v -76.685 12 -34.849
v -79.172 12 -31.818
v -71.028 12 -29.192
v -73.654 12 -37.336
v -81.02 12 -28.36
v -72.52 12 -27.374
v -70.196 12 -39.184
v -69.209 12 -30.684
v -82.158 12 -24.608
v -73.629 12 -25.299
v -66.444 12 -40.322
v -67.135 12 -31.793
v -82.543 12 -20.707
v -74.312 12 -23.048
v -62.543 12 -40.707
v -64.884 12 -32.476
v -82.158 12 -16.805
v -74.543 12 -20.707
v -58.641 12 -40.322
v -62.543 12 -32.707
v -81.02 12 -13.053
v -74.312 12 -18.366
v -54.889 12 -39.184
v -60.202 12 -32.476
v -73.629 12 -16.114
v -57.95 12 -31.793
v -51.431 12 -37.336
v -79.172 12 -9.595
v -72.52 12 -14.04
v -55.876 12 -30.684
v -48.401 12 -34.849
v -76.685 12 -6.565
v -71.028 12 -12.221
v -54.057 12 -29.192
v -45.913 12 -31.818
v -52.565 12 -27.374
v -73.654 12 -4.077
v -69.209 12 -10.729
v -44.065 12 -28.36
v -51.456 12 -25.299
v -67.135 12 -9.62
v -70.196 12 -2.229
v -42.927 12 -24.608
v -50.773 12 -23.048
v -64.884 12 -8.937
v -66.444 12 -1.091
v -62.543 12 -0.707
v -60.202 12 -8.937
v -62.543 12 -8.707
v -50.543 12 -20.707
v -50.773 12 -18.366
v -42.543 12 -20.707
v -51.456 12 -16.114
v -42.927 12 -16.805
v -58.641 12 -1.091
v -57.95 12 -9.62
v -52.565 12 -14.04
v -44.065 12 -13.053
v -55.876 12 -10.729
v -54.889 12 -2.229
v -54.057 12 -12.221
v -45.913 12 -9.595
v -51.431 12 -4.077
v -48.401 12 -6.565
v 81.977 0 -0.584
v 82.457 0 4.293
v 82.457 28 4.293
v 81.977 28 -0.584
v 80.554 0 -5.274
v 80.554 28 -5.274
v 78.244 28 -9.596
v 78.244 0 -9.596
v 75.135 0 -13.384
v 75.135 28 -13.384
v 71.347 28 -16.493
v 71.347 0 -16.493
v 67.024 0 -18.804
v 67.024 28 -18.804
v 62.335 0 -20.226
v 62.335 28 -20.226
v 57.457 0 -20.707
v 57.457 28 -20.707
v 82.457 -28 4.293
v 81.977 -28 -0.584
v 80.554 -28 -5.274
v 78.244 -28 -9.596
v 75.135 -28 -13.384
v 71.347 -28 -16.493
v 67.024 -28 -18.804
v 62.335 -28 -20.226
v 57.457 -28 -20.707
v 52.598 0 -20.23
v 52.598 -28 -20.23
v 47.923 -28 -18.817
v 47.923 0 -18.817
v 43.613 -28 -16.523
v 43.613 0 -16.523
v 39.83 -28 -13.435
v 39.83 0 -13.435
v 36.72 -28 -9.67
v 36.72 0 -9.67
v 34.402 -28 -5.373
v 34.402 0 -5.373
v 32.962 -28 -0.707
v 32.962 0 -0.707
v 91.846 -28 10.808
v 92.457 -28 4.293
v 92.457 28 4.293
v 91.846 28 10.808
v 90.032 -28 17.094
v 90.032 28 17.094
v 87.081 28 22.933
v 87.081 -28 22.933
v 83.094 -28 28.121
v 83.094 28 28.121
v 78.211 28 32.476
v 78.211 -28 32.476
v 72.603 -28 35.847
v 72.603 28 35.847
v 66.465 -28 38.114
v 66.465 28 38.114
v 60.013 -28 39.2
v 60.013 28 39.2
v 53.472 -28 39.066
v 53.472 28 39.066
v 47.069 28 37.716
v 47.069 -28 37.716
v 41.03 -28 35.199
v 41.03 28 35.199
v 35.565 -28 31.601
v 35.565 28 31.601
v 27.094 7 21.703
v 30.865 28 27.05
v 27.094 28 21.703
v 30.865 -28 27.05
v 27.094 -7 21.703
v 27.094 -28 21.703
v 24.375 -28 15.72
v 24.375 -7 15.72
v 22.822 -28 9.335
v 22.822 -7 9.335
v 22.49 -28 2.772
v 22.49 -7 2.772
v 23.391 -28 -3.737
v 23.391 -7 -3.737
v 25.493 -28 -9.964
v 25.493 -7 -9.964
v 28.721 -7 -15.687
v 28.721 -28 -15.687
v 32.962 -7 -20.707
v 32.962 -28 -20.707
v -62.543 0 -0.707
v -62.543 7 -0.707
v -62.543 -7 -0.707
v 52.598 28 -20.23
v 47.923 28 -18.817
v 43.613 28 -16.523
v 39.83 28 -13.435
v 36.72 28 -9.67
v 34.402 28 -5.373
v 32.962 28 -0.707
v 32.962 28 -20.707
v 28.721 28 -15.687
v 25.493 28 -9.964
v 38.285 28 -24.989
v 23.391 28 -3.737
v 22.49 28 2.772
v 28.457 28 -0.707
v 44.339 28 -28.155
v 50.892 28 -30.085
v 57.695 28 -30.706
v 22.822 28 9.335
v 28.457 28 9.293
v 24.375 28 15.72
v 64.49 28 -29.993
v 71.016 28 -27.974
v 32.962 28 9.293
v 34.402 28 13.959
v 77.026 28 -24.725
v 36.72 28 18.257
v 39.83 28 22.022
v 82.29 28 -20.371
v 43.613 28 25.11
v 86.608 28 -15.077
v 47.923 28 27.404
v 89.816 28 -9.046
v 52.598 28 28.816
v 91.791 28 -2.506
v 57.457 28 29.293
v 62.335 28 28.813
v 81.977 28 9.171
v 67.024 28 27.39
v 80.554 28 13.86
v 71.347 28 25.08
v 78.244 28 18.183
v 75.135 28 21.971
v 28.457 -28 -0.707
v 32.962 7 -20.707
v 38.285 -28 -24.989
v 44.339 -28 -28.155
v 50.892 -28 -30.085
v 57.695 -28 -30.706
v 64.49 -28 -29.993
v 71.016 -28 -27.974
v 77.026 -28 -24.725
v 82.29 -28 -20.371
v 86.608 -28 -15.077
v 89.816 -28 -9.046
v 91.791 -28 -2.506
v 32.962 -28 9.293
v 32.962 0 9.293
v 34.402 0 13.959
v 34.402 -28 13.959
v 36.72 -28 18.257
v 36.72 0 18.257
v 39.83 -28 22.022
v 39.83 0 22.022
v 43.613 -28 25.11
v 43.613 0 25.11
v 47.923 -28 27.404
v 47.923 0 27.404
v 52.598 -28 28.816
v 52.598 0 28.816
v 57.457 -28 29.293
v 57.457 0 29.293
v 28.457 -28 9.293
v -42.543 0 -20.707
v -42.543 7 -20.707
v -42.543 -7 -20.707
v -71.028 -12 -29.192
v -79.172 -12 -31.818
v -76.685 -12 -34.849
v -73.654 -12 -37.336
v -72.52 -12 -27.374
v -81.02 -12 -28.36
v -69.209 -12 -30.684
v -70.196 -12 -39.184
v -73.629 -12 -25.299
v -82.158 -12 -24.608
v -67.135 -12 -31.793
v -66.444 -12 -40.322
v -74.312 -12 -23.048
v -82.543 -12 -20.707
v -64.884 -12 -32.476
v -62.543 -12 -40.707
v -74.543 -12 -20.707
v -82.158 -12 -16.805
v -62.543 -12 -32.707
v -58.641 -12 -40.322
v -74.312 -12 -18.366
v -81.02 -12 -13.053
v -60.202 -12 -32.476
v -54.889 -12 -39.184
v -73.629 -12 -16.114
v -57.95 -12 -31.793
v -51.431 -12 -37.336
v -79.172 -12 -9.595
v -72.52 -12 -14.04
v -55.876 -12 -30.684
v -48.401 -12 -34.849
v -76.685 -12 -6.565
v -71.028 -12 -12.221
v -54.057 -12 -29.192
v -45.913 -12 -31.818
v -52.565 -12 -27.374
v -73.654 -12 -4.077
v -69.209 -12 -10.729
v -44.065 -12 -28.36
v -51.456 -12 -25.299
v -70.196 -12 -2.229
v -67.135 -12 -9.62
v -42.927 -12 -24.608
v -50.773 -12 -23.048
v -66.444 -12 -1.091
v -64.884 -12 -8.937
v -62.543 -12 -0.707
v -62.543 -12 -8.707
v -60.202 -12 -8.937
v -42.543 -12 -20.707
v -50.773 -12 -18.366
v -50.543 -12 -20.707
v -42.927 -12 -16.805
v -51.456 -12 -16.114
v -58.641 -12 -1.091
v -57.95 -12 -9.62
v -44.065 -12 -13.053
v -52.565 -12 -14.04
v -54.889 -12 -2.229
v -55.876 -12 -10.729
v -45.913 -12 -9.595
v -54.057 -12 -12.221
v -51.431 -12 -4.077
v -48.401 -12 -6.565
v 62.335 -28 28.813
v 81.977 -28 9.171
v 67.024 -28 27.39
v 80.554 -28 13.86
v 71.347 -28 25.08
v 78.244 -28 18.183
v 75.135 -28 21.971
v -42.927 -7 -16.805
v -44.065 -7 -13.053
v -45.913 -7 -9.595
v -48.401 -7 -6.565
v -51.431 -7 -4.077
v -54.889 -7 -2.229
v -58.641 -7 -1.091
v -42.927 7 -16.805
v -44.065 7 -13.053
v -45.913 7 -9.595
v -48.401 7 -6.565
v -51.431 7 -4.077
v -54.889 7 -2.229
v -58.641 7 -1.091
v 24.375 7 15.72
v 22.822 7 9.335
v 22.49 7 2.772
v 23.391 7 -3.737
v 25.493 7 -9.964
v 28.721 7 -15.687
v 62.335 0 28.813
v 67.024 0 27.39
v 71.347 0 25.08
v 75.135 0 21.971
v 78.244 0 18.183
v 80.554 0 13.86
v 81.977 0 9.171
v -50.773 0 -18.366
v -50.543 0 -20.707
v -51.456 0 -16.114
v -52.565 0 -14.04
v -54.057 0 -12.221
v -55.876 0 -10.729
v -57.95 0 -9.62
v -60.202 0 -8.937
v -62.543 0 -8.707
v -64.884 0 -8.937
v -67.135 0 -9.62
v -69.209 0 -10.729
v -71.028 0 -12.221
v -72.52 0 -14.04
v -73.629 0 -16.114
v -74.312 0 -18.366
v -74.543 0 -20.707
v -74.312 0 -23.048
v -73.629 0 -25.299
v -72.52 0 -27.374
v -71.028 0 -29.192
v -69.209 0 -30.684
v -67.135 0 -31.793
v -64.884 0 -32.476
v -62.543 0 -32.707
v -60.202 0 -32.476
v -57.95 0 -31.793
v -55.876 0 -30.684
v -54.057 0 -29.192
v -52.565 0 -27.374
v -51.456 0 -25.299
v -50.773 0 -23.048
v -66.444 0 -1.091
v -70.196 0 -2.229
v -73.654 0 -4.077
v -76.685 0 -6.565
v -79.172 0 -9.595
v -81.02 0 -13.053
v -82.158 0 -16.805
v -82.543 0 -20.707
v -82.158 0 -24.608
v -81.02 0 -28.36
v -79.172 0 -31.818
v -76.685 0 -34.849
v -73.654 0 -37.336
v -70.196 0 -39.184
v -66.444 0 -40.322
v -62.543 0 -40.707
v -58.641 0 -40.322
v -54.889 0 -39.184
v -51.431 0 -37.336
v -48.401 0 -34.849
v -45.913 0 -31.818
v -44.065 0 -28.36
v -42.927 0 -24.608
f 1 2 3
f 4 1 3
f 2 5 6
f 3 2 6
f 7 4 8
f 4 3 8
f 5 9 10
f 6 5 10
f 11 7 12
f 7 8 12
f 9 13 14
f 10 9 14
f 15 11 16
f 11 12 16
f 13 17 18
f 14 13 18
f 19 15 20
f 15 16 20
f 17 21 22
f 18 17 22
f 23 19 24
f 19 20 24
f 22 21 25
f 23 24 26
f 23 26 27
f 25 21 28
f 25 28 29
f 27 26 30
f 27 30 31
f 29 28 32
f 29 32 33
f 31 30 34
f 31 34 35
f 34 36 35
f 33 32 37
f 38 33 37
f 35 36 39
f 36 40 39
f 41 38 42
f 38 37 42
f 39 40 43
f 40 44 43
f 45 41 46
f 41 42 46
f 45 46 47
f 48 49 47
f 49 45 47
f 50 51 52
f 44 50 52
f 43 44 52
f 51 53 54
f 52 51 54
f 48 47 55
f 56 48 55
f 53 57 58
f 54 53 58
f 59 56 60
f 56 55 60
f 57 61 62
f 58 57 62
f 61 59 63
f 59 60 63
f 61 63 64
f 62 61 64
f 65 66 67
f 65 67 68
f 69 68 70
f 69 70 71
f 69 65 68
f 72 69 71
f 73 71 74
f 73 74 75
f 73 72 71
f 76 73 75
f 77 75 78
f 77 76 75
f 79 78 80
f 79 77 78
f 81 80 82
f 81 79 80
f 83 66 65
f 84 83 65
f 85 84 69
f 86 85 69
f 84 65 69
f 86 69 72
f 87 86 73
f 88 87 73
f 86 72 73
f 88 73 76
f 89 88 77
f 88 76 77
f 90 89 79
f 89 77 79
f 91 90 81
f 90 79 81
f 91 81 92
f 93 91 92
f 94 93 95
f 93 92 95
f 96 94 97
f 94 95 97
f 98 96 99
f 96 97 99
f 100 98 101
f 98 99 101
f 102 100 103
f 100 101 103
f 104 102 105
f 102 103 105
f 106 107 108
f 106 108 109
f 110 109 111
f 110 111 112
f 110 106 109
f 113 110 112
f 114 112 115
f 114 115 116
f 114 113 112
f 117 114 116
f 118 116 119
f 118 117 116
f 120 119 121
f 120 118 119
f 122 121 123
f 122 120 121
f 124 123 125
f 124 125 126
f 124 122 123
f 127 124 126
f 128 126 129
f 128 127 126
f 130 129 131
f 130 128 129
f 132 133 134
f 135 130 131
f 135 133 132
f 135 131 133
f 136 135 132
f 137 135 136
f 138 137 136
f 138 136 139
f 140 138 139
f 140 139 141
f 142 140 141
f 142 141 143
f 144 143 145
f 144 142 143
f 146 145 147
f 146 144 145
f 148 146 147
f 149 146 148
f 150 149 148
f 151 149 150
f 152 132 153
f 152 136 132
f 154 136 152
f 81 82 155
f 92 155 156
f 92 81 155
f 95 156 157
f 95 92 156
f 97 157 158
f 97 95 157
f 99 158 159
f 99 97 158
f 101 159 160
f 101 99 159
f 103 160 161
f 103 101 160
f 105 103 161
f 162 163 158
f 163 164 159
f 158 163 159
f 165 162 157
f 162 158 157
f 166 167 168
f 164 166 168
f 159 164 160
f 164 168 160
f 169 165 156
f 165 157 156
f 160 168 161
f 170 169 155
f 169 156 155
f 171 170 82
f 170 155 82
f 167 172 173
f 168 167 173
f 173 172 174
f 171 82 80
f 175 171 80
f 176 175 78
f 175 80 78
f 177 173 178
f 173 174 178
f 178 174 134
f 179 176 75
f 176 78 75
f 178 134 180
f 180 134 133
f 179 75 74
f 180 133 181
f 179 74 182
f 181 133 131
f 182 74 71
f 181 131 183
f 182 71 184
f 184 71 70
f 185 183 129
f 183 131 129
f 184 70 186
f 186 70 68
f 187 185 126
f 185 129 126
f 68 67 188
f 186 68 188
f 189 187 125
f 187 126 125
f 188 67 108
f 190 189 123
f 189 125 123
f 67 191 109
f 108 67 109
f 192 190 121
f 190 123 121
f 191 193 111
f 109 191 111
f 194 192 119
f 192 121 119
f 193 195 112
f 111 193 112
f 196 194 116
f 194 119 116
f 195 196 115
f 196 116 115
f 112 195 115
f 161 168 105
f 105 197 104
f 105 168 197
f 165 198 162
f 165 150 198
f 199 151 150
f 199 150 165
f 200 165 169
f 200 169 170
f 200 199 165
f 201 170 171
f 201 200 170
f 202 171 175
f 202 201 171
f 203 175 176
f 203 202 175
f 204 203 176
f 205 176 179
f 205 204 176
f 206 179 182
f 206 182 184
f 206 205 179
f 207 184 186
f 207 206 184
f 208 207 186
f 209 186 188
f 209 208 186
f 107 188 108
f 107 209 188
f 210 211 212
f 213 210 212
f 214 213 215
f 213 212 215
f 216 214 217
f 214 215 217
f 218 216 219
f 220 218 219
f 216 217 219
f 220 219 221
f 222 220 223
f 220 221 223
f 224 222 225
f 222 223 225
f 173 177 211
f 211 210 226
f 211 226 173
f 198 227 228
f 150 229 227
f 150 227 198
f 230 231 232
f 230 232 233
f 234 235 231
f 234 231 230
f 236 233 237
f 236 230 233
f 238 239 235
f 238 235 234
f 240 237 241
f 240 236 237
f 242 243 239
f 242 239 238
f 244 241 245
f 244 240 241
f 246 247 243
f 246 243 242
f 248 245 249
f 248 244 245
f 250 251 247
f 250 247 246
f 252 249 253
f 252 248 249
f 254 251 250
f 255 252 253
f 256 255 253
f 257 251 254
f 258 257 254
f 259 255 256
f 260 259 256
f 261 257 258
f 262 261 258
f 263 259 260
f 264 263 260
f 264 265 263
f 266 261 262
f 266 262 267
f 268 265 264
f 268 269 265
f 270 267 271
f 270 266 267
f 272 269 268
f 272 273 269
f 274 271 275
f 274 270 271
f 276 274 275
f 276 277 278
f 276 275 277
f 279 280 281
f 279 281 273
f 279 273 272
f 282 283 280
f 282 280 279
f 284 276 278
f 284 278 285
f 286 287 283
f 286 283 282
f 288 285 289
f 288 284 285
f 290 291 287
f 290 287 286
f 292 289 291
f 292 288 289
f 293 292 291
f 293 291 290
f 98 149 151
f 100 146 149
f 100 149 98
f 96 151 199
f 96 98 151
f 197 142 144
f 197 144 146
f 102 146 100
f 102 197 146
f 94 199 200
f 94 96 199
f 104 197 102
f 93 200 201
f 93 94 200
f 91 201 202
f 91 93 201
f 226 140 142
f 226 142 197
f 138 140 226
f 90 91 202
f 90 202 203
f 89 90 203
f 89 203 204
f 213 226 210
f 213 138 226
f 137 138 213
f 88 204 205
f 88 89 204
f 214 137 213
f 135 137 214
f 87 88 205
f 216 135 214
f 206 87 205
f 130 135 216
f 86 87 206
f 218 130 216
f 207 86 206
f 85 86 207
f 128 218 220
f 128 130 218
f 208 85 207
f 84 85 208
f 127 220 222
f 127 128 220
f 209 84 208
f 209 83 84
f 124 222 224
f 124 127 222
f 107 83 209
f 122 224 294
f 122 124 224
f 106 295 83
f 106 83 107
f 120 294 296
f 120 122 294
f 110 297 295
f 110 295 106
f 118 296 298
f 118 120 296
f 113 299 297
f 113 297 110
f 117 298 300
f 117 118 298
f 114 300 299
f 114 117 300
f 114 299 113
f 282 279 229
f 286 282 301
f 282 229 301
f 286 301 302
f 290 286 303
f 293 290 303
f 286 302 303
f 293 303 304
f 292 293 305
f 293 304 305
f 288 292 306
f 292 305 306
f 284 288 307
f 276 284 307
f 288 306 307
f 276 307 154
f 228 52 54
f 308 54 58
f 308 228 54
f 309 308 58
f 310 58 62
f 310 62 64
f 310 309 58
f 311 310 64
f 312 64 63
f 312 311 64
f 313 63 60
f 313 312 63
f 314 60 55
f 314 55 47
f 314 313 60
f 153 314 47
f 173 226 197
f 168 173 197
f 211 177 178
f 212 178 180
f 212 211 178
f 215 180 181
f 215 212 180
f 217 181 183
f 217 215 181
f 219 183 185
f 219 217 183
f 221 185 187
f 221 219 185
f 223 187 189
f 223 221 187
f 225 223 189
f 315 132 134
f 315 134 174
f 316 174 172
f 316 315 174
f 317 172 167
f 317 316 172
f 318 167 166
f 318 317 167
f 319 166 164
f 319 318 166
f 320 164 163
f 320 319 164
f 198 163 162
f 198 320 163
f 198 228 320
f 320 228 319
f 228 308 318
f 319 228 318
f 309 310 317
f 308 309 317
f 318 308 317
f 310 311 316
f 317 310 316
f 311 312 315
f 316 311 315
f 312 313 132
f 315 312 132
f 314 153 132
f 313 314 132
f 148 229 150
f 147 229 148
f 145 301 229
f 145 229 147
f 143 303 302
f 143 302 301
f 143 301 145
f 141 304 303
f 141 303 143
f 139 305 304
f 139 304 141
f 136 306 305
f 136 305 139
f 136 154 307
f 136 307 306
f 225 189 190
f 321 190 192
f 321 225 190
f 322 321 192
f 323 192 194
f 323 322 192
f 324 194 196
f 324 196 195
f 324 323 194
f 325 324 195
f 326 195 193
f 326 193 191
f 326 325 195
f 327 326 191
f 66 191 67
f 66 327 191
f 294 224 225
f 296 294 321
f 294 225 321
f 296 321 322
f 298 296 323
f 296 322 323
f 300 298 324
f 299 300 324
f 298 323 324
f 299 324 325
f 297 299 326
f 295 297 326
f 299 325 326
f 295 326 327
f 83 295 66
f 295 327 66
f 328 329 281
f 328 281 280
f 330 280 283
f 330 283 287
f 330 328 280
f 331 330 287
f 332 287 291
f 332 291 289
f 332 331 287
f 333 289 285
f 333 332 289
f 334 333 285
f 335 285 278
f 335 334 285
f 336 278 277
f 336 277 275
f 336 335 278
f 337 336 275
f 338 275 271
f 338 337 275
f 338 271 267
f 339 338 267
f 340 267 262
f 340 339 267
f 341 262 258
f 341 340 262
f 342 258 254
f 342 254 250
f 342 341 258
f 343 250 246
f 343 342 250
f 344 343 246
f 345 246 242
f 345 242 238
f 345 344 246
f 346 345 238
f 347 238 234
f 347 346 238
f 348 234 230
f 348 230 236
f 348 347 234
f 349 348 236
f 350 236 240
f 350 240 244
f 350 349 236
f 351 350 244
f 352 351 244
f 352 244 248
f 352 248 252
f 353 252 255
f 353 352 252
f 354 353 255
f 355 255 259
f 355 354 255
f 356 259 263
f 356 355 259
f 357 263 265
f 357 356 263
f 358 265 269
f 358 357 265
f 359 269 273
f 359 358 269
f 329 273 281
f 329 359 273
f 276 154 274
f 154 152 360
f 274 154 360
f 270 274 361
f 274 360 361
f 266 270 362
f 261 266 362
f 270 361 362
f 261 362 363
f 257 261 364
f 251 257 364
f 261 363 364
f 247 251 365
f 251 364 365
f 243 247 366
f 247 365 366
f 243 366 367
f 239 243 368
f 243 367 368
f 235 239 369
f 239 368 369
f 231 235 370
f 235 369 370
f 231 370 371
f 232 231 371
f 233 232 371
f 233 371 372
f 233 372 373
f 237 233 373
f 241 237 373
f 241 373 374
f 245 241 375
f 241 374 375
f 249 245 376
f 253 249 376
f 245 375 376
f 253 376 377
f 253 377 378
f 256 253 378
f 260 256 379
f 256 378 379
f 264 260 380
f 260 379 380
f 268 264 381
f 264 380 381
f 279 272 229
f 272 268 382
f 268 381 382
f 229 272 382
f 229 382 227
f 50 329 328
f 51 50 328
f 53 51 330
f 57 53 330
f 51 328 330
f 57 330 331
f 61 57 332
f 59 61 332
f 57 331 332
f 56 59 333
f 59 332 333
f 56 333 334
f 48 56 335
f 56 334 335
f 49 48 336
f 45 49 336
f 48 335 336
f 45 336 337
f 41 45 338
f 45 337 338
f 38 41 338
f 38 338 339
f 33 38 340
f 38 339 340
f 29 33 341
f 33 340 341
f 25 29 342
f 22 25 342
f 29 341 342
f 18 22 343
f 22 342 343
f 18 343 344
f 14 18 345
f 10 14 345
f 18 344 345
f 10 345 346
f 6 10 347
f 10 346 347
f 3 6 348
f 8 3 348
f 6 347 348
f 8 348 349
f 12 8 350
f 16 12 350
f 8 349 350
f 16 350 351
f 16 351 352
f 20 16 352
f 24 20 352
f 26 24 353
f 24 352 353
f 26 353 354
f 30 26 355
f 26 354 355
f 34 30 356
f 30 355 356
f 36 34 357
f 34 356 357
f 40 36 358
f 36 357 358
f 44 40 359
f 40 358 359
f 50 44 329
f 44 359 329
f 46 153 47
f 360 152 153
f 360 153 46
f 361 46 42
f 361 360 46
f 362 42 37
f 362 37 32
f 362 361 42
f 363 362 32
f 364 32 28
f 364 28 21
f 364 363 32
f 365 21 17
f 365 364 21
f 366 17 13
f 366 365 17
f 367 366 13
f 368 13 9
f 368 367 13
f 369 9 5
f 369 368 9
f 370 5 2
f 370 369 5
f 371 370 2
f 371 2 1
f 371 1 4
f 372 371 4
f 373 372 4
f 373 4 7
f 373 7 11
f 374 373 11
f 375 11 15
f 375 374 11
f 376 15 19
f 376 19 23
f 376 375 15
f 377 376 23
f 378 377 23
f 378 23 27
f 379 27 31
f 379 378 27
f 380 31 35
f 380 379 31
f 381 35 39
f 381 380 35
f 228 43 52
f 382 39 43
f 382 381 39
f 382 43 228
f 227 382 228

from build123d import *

# Parameters (mm, degrees)
F1_DEPTH      = 7
F1_DEPTH_BACK = 7
F0_R          = 12
F2_DEPTH      = 12
F2_DEPTH_BACK = 12
F3_DEPTH      = 28
F3_DEPTH_BACK = 28
F5_DEPTH      = 57.4
F5_DEPTH_BACK = 40.2
F6_DEPTH      = 102.2
F6_DEPTH_BACK = 32.7


with BuildPart() as f1:
    # F0 (on Front) → F1 (new body, two sides)
    with BuildSketch(Plane.XZ) as f1_sk:
        with BuildLine():
            ThreePointArc((-62.5426396728, -0.7066852599), (-48.400504049, -6.5645496362), (-42.5426396728, -20.7066852599))
            Line((-42.5426396728, -20.7066852599), (32.9624628994, -20.7066852599))
            ThreePointArc((32.9624628994, -20.7066852599), (22.7876905063, -0.5039755893), (27.0942402723, 21.7025347263))
            Line((27.0942402723, 21.7025347263), (-62.5426396728, -0.7066852599))
        make_face()
    extrude(amount=F1_DEPTH)
    extrude(f1_sk.sketch, amount=-F1_DEPTH_BACK)

    # F0 (on Front) → F2 (join, two sides)
    with BuildSketch(Plane.XZ) as f2_sk:
        with BuildLine():
            ThreePointArc((-62.5426396728, -0.7066852599), (-76.6847752965, -34.8488208837), (-42.5426396728, -20.7066852599))
            ThreePointArc((-42.5426396728, -20.7066852599), (-48.400504049, -6.5645496362), (-62.5426396728, -0.7066852599))
        make_face()
        with Locations((-62.5426396728, -20.7066852599)):
            Circle(F0_R, mode=Mode.SUBTRACT)
    extrude(amount=F2_DEPTH)
    extrude(f2_sk.sketch, amount=-F2_DEPTH_BACK)

    # F0 (on Front) → F3 (join, two sides)
    with BuildSketch(Plane.XZ) as f3_sk:
        with BuildLine():
            ThreePointArc((27.0942402723, 21.7025347263), (22.7876905063, -0.5039755893), (32.9624628994, -20.7066852599))
            ThreePointArc((32.9624628994, -20.7066852599), (71.0160953351, -27.9737072017), (92.4573603272, 4.2933147401))
            ThreePointArc((92.4573603272, 4.2933147401), (66.4654344299, 38.114234316), (27.0942402723, 21.7025347263))
        make_face()
        with BuildLine():
            ThreePointArc((57.4573603272, 29.2933147401), (75.1350298569, 21.9709842697), (82.4573603272, 4.2933147401))
            ThreePointArc((82.4573603272, 4.2933147401), (75.1350298569, -13.3843547896), (57.4573603272, -20.7066852599))
            ThreePointArc((57.4573603272, -20.7066852599), (39.7796907976, -13.3843547896), (32.4573603272, 4.2933147401))
            ThreePointArc((32.4573603272, 4.2933147401), (39.7796907976, 21.9709842697), (57.4573603272, 29.2933147401))
        make_face(mode=Mode.SUBTRACT)
    extrude(amount=F3_DEPTH)
    extrude(f3_sk.sketch, amount=-F3_DEPTH_BACK)

    # F4 (on face) → F5 (cut, two sides)
    with BuildSketch(Plane.XZ) as f5_sk:
        with BuildLine():
            ThreePointArc((32.9624628994, -0.7066852599), (32.5839565021, 1.7805906899), (32.4573603272, 4.2933147401))
            Line((32.4573603272, 4.2933147401), (28.4573603272, 4.2933147401))
            Line((28.4573603272, 4.2933147401), (28.4573603272, -0.7066852599))
            Line((28.4573603272, -0.7066852599), (32.9624628994, -0.7066852599))
        make_face()
    extrude(amount=-F5_DEPTH, mode=Mode.SUBTRACT)
    extrude(f5_sk.sketch, amount=F5_DEPTH_BACK, mode=Mode.SUBTRACT)

    # F4 (on face) → F6 (cut, two sides)
    with BuildSketch(Plane.XZ) as f6_sk:
        with BuildLine():
            Line((28.4573603272, 4.2933147401), (32.4573603272, 4.2933147401))
            ThreePointArc((32.4573603272, 4.2933147401), (32.5839565021, 6.8060387902), (32.9624628994, 9.2933147401))
            Line((32.9624628994, 9.2933147401), (32.4573603272, 9.2933147401))
            Line((32.4573603272, 9.2933147401), (28.4573603272, 9.2933147401))
            Line((28.4573603272, 9.2933147401), (28.4573603272, 4.2933147401))
        make_face()
    extrude(amount=-F6_DEPTH, mode=Mode.SUBTRACT)
    extrude(f6_sk.sketch, amount=F6_DEPTH_BACK, mode=Mode.SUBTRACT)


solid = f1.part
